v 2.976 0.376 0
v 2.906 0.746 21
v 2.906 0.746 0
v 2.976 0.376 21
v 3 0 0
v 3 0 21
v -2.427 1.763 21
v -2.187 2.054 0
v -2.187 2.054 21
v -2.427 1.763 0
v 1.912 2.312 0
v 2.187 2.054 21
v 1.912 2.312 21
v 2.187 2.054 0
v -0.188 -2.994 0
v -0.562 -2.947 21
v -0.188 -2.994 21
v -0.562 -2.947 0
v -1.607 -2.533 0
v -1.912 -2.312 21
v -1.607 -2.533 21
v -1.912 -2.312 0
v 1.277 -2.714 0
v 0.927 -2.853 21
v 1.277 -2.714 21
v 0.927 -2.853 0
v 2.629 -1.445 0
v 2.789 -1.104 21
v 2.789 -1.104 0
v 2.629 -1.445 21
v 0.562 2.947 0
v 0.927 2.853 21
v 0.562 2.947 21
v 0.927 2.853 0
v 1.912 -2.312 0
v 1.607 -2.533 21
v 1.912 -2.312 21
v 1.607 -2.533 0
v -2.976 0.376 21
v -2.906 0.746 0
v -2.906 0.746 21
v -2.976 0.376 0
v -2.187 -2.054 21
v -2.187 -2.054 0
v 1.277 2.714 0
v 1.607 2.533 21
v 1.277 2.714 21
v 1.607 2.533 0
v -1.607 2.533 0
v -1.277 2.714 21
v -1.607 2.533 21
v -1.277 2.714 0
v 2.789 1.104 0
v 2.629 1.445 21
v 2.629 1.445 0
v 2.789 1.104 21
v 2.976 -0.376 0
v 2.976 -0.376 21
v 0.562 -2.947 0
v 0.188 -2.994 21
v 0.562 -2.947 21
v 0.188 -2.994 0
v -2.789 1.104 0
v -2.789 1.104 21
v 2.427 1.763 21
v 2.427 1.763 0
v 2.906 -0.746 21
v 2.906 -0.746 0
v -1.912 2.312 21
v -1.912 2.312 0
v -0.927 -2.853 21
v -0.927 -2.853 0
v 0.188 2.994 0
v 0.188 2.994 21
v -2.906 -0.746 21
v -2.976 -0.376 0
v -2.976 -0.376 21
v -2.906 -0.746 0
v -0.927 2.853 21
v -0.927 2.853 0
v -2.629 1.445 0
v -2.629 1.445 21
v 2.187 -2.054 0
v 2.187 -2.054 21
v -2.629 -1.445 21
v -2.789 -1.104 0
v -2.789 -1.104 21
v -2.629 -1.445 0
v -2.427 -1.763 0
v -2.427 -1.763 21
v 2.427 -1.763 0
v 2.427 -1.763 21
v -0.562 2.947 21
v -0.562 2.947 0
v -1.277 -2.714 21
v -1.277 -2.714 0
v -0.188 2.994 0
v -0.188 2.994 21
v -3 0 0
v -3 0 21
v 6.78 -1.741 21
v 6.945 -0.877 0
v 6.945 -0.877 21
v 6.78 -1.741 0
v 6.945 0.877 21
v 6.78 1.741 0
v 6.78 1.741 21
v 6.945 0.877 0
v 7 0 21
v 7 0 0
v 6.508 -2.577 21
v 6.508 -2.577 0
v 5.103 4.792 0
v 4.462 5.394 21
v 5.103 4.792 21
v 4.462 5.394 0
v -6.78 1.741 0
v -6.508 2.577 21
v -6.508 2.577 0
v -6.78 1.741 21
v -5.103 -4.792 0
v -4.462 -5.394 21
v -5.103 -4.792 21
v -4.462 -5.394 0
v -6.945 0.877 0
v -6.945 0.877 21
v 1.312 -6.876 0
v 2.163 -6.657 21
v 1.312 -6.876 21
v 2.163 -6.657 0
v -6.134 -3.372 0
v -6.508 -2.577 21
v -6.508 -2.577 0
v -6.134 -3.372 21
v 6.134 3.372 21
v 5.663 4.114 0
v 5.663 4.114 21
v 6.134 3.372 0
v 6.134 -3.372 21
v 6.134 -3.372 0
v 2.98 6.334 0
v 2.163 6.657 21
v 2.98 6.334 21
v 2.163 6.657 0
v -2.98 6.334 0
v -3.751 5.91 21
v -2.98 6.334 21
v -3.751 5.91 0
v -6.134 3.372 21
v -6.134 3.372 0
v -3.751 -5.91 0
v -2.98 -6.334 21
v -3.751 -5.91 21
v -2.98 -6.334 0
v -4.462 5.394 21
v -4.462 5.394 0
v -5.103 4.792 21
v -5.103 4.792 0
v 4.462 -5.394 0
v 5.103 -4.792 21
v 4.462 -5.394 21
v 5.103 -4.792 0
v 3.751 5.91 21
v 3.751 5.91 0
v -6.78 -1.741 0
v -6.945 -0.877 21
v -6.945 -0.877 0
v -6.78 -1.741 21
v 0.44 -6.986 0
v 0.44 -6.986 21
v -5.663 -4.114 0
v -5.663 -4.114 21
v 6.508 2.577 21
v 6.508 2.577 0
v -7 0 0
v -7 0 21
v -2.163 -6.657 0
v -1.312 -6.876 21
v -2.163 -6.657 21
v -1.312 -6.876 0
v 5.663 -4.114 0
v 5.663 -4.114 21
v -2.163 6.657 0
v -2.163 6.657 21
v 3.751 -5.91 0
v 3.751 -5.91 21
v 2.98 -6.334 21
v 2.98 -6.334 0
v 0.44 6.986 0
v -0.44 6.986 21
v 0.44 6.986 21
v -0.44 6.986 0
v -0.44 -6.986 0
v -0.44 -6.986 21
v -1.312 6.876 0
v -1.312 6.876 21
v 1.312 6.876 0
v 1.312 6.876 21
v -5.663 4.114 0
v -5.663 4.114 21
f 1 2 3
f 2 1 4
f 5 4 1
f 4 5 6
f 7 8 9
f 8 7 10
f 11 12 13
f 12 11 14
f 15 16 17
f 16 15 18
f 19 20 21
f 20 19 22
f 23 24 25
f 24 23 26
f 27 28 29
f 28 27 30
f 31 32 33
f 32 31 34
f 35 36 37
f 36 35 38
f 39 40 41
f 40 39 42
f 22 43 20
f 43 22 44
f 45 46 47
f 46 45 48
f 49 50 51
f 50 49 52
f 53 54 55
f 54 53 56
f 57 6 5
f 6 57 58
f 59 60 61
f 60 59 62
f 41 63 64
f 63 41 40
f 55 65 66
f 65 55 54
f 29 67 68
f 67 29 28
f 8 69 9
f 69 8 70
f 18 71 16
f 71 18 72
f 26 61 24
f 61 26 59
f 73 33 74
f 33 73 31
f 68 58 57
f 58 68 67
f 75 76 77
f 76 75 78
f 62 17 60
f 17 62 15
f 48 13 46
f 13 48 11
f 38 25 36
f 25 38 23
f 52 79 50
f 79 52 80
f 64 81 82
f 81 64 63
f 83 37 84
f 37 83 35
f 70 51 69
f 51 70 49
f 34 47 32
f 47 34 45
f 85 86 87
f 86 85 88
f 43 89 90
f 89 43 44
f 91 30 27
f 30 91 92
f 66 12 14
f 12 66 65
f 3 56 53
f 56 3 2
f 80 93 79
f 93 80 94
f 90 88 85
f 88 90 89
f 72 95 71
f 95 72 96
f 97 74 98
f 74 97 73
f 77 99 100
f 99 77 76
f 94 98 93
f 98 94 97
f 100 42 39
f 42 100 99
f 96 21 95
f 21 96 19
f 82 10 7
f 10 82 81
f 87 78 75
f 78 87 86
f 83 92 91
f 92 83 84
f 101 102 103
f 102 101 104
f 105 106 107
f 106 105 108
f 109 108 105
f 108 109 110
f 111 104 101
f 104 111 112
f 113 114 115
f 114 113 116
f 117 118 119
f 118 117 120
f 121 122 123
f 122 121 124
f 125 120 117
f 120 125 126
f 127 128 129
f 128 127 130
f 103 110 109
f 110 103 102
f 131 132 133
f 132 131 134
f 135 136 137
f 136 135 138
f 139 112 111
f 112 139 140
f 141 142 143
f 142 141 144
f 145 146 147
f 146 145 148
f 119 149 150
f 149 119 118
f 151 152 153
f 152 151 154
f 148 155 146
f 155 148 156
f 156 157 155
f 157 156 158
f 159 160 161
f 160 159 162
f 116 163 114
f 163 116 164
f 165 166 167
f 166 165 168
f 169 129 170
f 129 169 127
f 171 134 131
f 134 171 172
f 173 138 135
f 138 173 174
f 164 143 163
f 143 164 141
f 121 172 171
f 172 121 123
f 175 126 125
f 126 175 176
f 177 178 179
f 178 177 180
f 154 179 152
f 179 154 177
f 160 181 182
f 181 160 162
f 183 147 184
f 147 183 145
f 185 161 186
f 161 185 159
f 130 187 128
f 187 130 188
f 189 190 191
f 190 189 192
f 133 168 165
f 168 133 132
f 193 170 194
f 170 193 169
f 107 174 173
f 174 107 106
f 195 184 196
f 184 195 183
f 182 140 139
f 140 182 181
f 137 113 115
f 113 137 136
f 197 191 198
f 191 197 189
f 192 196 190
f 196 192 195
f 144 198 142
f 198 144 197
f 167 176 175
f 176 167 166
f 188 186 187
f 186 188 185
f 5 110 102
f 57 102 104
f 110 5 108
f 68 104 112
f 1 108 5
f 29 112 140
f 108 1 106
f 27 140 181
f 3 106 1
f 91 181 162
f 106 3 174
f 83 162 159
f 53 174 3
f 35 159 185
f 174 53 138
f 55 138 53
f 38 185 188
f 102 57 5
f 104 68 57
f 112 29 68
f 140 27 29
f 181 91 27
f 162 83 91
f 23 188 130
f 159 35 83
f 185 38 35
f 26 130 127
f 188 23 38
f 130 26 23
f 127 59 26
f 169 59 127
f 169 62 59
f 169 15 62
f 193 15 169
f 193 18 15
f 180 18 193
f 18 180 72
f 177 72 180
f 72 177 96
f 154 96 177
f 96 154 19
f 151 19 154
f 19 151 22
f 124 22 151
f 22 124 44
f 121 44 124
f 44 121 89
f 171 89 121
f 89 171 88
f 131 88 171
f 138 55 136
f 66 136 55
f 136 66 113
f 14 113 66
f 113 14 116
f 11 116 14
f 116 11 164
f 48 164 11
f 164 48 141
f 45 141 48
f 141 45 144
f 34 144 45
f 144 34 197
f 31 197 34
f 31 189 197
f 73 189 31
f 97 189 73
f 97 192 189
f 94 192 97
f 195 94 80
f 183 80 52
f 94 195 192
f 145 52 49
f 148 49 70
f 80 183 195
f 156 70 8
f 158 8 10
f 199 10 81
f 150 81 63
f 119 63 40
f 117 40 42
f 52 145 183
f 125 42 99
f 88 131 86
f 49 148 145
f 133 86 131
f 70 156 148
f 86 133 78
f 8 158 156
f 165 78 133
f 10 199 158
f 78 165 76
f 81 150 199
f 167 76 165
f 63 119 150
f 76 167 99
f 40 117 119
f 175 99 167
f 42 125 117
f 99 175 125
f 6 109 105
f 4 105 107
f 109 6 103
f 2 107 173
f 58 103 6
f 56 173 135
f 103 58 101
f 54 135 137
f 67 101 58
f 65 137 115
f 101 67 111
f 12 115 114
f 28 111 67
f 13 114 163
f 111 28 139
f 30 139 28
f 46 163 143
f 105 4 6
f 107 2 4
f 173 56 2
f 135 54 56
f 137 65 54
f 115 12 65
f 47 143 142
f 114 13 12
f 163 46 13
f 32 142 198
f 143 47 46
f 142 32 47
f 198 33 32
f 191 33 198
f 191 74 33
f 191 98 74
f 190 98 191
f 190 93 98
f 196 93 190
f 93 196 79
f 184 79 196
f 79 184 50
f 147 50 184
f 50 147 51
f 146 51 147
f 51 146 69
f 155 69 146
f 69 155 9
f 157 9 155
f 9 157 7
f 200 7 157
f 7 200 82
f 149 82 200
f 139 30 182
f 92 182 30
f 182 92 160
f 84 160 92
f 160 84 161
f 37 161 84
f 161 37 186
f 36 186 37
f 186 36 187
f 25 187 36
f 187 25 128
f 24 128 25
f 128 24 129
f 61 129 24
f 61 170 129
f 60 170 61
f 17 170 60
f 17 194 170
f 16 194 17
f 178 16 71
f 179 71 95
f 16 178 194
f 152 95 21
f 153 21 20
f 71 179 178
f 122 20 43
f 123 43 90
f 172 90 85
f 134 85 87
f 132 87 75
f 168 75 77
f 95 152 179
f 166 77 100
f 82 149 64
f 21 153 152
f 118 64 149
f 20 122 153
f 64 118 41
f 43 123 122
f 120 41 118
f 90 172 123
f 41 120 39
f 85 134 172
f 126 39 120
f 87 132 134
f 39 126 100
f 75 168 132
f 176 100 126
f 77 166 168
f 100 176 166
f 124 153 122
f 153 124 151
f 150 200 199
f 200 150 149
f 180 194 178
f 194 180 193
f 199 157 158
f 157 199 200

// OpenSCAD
$fn = 50;


difference() {
	union() {
		cylinder(h = 21, r = 7.0000000000);
	}
	union() {
		translate(v = [0.0000000000, 0.0000000000, -100.0000000000]) {
			cylinder(h = 200, r = 3.0000000000);
		}
		cylinder(h = 21, r = 1.5000000000);
		cylinder(h = 21, r = 1.5000000000);
		cylinder(h = 21, r = 1.5000000000);
	}
}
